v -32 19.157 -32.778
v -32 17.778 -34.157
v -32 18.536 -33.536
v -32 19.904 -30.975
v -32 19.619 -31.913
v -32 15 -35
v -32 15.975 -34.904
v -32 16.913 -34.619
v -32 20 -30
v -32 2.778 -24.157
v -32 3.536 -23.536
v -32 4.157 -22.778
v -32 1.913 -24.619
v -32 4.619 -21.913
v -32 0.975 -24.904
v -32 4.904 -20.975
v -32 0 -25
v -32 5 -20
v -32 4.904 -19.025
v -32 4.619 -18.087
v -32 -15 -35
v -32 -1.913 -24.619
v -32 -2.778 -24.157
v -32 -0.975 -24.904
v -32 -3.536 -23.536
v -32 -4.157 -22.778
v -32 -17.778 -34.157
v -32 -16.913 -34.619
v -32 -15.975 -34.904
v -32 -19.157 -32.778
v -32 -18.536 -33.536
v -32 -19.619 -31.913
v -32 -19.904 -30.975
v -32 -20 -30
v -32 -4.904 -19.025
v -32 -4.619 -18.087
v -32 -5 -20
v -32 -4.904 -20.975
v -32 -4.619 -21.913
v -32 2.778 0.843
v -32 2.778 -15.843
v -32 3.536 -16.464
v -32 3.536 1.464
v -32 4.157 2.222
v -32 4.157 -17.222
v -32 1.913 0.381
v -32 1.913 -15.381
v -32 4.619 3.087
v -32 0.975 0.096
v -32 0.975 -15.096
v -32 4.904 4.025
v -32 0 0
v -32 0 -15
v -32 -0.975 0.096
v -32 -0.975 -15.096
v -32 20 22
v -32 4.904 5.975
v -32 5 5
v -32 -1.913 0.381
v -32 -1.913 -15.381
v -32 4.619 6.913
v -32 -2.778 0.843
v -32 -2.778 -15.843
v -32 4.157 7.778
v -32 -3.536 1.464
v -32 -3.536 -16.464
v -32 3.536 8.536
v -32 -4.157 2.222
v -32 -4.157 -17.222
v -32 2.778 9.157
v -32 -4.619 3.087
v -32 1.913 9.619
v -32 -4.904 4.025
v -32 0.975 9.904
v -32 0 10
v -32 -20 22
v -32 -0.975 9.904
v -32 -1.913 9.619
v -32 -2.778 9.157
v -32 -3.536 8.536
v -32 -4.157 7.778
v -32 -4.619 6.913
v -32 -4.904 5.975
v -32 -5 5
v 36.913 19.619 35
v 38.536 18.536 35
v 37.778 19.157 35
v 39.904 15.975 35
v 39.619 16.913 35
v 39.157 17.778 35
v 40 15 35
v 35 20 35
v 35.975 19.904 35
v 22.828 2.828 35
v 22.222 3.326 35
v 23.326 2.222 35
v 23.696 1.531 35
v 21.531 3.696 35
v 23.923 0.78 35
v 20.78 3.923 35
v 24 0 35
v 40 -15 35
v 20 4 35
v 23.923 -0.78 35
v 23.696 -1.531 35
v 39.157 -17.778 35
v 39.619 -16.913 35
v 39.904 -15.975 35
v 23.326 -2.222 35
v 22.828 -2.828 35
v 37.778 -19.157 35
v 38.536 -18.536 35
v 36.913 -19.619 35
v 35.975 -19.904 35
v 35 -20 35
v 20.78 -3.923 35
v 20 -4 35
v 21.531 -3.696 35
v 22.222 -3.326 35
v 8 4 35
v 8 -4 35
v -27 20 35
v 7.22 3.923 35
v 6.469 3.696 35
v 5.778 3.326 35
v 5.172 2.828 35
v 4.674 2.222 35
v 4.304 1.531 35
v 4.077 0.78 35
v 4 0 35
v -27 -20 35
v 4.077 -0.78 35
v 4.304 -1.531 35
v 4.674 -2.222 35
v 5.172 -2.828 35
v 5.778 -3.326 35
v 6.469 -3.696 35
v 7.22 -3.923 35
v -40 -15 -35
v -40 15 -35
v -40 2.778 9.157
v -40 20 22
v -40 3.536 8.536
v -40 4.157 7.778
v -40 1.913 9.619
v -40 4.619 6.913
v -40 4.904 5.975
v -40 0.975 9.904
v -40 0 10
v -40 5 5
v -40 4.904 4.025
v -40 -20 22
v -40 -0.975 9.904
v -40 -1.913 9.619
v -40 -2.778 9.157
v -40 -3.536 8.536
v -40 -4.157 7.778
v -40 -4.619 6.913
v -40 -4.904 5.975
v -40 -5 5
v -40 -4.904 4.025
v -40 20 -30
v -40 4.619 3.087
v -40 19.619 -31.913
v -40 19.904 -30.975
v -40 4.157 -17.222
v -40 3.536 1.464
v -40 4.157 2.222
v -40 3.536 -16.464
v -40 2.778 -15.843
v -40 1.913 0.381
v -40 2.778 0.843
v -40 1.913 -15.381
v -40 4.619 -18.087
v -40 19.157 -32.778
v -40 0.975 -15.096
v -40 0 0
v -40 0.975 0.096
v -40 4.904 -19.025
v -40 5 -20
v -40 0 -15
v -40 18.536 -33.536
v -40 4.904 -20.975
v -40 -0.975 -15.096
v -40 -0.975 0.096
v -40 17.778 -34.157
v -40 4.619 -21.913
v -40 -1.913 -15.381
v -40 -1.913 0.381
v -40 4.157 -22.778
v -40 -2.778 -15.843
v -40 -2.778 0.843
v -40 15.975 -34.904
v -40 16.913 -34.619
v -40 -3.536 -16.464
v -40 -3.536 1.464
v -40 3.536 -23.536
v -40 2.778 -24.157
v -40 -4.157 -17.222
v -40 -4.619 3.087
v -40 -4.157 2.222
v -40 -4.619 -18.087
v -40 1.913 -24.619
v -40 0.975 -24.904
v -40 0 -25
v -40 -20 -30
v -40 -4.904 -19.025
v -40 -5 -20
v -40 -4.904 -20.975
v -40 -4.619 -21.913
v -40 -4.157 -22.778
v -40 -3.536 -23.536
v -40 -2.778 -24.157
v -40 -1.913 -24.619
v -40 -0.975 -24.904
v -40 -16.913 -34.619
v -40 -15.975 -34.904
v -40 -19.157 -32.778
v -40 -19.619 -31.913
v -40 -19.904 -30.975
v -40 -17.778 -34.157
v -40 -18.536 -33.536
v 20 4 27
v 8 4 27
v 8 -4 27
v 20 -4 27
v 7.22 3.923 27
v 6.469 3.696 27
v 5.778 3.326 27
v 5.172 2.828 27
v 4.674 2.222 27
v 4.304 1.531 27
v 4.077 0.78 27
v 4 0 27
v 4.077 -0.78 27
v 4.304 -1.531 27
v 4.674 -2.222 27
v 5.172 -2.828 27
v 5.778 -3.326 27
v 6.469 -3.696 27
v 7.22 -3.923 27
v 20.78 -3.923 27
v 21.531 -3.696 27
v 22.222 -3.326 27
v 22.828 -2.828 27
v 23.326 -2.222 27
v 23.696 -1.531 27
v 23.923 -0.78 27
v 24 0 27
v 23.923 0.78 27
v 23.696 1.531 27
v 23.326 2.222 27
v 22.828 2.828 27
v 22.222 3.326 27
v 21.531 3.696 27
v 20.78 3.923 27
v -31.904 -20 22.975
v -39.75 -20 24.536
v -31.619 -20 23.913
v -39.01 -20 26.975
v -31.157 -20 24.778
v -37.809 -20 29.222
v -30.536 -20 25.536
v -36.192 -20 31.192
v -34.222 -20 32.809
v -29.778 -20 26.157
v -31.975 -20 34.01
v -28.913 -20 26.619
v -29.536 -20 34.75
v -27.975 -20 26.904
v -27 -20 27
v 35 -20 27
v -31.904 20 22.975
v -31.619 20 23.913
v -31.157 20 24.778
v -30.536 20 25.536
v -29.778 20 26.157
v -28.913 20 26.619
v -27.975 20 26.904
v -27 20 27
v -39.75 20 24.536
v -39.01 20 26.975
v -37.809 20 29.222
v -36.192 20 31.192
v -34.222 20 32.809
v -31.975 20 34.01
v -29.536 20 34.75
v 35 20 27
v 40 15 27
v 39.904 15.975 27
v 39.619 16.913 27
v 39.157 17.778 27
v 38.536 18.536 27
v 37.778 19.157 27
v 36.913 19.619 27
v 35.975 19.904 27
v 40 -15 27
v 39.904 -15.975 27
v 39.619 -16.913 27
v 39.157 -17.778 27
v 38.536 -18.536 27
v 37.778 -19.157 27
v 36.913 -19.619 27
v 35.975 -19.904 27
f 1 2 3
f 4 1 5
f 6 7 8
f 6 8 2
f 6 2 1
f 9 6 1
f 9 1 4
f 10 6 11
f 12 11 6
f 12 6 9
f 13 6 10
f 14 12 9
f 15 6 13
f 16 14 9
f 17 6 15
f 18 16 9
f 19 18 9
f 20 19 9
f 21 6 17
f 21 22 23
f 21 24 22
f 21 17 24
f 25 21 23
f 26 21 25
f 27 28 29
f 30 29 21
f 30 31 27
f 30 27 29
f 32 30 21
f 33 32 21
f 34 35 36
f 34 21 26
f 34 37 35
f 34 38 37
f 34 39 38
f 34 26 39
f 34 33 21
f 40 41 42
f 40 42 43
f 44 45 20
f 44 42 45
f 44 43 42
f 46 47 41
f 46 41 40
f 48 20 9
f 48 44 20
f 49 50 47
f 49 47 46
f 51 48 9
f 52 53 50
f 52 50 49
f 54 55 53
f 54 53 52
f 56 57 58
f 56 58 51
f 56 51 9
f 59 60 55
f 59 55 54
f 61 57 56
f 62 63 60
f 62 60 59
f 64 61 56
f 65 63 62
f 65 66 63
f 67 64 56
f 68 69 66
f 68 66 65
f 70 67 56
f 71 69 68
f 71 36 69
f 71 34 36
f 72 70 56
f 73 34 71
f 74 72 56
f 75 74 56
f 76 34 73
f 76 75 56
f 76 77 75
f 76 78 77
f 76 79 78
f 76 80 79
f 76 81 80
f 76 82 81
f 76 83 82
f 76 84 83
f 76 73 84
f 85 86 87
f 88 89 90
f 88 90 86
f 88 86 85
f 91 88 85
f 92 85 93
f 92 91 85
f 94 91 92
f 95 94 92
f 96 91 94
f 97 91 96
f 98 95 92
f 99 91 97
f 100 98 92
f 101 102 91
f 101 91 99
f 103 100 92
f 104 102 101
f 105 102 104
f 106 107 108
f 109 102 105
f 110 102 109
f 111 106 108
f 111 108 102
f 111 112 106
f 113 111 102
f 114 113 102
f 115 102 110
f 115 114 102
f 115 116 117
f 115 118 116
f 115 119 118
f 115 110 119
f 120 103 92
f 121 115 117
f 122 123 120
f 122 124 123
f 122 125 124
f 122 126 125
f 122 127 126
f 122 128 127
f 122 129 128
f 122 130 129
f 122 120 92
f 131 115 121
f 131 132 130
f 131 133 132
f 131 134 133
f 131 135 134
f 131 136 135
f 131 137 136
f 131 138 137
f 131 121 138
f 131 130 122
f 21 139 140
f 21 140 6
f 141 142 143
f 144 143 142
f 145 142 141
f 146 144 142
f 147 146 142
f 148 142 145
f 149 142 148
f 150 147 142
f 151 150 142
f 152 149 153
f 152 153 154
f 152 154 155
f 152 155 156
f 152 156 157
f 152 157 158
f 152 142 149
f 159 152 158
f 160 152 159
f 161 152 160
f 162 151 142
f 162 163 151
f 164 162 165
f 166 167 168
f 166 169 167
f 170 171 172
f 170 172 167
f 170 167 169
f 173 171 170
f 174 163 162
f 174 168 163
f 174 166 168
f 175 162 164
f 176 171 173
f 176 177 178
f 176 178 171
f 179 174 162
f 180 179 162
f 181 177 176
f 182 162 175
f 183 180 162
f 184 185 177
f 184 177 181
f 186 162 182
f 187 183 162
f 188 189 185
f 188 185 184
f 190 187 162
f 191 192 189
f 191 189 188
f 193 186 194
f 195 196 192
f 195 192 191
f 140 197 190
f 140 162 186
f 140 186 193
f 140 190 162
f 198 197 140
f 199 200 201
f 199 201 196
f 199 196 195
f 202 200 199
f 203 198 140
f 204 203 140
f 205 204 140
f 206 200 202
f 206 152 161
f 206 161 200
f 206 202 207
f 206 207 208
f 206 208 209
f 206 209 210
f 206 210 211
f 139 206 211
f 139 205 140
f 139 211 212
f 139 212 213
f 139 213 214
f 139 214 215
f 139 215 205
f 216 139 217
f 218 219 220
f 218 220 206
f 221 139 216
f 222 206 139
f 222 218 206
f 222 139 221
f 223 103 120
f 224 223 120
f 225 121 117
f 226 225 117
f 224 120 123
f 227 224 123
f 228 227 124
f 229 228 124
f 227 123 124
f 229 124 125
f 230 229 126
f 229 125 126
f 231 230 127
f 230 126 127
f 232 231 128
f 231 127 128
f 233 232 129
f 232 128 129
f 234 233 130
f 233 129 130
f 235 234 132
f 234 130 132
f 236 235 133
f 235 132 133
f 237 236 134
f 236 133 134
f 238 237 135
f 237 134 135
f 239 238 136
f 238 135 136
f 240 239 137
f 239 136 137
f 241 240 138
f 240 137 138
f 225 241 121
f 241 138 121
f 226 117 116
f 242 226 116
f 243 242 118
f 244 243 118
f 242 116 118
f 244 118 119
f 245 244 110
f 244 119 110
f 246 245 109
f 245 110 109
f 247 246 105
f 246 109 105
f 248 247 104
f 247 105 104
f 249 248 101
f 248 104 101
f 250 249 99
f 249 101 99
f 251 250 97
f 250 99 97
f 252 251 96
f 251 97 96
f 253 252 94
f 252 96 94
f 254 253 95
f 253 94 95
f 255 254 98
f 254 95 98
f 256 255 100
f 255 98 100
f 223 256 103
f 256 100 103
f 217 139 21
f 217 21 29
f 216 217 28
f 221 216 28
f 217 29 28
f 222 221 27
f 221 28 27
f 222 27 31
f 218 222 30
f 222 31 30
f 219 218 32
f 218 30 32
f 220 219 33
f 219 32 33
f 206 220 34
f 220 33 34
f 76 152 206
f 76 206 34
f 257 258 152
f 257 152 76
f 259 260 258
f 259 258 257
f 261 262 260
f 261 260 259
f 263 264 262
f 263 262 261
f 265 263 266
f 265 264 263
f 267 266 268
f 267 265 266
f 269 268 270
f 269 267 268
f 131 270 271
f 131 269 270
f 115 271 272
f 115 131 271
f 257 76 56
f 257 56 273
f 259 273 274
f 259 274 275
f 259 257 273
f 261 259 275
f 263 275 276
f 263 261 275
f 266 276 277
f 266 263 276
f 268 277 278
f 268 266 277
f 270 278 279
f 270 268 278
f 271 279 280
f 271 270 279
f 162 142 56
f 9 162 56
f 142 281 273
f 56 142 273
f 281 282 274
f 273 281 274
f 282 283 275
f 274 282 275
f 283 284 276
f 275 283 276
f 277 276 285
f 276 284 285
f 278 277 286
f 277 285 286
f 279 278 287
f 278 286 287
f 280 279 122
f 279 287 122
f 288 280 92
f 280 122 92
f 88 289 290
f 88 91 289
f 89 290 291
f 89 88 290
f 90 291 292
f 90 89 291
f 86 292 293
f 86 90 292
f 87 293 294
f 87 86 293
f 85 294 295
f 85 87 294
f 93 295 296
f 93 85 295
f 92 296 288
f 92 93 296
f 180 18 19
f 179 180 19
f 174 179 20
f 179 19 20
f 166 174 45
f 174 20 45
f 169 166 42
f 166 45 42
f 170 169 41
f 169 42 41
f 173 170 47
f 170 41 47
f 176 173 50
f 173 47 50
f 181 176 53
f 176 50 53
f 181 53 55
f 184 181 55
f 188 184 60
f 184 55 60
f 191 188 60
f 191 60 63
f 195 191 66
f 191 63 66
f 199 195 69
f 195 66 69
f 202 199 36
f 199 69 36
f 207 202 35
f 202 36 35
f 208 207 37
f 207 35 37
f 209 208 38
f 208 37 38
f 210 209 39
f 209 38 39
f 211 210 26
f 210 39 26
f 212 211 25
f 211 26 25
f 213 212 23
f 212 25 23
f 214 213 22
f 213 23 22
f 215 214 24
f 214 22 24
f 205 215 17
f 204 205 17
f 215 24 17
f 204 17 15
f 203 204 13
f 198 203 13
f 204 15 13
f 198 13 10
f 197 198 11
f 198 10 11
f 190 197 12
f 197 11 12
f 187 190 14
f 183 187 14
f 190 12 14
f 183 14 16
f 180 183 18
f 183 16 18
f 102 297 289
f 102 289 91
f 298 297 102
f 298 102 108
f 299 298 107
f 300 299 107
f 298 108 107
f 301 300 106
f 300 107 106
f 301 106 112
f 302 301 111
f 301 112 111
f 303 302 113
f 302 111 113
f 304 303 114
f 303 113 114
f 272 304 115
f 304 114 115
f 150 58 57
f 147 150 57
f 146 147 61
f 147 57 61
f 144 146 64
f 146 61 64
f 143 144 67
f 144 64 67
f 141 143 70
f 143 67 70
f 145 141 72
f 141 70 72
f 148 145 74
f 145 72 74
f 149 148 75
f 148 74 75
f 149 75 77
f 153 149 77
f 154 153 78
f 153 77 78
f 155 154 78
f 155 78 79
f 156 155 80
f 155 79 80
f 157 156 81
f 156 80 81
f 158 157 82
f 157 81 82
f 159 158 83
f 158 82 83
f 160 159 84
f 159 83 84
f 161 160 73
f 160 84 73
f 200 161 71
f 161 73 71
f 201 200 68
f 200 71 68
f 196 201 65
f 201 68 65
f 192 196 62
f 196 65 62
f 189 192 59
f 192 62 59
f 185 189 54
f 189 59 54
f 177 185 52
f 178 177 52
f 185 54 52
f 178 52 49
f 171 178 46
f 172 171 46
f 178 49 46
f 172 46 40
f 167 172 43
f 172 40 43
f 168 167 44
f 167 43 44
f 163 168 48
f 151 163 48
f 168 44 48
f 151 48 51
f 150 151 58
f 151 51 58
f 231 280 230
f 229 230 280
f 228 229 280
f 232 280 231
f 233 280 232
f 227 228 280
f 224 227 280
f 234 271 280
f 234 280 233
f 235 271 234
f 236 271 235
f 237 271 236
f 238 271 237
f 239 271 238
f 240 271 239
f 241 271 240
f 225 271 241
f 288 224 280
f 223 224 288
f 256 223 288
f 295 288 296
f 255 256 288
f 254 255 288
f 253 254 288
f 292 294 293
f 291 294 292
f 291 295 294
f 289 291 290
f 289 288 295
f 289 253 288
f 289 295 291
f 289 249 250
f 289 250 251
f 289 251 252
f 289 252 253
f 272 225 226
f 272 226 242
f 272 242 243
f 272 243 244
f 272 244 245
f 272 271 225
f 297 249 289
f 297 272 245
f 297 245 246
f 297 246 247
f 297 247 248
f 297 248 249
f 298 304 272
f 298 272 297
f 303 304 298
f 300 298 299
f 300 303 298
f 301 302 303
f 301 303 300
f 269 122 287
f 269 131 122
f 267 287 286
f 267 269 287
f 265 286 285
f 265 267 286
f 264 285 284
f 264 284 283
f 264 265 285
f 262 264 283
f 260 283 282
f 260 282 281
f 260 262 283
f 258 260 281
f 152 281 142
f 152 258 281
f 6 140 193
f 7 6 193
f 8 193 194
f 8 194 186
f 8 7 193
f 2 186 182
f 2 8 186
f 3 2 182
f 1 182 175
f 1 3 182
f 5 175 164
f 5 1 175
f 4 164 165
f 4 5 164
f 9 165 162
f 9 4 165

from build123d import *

# Parameters (mm, degrees)
F1_DEPTH = 20
F2_R     = 5
F4_DEPTH = 8
F5_R     = 5
F6_DEPTH = 8


with BuildPart() as f1:
    # F0 (on Front) → F1 (new body, symmetric)
    with BuildSketch(Plane.XZ):
        with BuildLine():
            Line((-40, -35), (-32, -35))
            Line((-32, -35), (-32, 22))
            ThreePointArc((-32, 22), (-30.535534, 25.535534), (-27, 27))
            Line((-27, 27), (40, 27))
            Line((40, 27), (40, 35))
            Line((40, 35), (-27, 35))
            ThreePointArc((-27, 35), (-36.192388, 31.192388), (-40, 22))
            Line((-40, 22), (-40, -35))
        make_face()
    extrude(amount=F1_DEPTH, both=True)

    # F2
    f2_edges = [f1.edges().sort_by_distance(p)[0] for p in [
        (40, -20, 31),
        (40, 20, 31),
        (-36, -20, -35),
        (-36, 20, -35),
    ]]
    fillet(f2_edges, radius=F2_R)

    # F3 (on face) → F4 (cut, through all)
    with BuildSketch(Plane.XY.offset(35)):
        with BuildLine():
            Line((8, -4), (20, -4))
            ThreePointArc((20, -4), (24, 0), (20, 4))
            Line((20, 4), (8, 4))
            ThreePointArc((8, 4), (4, 0), (8, -4))
        make_face()
    extrude(amount=-F4_DEPTH, mode=Mode.SUBTRACT)

    # F5 (on face) → F6 (cut, through all)
    with BuildSketch(Plane.YZ.offset(-32)):
        with Locations((0, -20)):
            Circle(F5_R)
        with Locations((0, 5)):
            Circle(F5_R)
    extrude(amount=-F6_DEPTH, mode=Mode.SUBTRACT)


solid = f1.part
